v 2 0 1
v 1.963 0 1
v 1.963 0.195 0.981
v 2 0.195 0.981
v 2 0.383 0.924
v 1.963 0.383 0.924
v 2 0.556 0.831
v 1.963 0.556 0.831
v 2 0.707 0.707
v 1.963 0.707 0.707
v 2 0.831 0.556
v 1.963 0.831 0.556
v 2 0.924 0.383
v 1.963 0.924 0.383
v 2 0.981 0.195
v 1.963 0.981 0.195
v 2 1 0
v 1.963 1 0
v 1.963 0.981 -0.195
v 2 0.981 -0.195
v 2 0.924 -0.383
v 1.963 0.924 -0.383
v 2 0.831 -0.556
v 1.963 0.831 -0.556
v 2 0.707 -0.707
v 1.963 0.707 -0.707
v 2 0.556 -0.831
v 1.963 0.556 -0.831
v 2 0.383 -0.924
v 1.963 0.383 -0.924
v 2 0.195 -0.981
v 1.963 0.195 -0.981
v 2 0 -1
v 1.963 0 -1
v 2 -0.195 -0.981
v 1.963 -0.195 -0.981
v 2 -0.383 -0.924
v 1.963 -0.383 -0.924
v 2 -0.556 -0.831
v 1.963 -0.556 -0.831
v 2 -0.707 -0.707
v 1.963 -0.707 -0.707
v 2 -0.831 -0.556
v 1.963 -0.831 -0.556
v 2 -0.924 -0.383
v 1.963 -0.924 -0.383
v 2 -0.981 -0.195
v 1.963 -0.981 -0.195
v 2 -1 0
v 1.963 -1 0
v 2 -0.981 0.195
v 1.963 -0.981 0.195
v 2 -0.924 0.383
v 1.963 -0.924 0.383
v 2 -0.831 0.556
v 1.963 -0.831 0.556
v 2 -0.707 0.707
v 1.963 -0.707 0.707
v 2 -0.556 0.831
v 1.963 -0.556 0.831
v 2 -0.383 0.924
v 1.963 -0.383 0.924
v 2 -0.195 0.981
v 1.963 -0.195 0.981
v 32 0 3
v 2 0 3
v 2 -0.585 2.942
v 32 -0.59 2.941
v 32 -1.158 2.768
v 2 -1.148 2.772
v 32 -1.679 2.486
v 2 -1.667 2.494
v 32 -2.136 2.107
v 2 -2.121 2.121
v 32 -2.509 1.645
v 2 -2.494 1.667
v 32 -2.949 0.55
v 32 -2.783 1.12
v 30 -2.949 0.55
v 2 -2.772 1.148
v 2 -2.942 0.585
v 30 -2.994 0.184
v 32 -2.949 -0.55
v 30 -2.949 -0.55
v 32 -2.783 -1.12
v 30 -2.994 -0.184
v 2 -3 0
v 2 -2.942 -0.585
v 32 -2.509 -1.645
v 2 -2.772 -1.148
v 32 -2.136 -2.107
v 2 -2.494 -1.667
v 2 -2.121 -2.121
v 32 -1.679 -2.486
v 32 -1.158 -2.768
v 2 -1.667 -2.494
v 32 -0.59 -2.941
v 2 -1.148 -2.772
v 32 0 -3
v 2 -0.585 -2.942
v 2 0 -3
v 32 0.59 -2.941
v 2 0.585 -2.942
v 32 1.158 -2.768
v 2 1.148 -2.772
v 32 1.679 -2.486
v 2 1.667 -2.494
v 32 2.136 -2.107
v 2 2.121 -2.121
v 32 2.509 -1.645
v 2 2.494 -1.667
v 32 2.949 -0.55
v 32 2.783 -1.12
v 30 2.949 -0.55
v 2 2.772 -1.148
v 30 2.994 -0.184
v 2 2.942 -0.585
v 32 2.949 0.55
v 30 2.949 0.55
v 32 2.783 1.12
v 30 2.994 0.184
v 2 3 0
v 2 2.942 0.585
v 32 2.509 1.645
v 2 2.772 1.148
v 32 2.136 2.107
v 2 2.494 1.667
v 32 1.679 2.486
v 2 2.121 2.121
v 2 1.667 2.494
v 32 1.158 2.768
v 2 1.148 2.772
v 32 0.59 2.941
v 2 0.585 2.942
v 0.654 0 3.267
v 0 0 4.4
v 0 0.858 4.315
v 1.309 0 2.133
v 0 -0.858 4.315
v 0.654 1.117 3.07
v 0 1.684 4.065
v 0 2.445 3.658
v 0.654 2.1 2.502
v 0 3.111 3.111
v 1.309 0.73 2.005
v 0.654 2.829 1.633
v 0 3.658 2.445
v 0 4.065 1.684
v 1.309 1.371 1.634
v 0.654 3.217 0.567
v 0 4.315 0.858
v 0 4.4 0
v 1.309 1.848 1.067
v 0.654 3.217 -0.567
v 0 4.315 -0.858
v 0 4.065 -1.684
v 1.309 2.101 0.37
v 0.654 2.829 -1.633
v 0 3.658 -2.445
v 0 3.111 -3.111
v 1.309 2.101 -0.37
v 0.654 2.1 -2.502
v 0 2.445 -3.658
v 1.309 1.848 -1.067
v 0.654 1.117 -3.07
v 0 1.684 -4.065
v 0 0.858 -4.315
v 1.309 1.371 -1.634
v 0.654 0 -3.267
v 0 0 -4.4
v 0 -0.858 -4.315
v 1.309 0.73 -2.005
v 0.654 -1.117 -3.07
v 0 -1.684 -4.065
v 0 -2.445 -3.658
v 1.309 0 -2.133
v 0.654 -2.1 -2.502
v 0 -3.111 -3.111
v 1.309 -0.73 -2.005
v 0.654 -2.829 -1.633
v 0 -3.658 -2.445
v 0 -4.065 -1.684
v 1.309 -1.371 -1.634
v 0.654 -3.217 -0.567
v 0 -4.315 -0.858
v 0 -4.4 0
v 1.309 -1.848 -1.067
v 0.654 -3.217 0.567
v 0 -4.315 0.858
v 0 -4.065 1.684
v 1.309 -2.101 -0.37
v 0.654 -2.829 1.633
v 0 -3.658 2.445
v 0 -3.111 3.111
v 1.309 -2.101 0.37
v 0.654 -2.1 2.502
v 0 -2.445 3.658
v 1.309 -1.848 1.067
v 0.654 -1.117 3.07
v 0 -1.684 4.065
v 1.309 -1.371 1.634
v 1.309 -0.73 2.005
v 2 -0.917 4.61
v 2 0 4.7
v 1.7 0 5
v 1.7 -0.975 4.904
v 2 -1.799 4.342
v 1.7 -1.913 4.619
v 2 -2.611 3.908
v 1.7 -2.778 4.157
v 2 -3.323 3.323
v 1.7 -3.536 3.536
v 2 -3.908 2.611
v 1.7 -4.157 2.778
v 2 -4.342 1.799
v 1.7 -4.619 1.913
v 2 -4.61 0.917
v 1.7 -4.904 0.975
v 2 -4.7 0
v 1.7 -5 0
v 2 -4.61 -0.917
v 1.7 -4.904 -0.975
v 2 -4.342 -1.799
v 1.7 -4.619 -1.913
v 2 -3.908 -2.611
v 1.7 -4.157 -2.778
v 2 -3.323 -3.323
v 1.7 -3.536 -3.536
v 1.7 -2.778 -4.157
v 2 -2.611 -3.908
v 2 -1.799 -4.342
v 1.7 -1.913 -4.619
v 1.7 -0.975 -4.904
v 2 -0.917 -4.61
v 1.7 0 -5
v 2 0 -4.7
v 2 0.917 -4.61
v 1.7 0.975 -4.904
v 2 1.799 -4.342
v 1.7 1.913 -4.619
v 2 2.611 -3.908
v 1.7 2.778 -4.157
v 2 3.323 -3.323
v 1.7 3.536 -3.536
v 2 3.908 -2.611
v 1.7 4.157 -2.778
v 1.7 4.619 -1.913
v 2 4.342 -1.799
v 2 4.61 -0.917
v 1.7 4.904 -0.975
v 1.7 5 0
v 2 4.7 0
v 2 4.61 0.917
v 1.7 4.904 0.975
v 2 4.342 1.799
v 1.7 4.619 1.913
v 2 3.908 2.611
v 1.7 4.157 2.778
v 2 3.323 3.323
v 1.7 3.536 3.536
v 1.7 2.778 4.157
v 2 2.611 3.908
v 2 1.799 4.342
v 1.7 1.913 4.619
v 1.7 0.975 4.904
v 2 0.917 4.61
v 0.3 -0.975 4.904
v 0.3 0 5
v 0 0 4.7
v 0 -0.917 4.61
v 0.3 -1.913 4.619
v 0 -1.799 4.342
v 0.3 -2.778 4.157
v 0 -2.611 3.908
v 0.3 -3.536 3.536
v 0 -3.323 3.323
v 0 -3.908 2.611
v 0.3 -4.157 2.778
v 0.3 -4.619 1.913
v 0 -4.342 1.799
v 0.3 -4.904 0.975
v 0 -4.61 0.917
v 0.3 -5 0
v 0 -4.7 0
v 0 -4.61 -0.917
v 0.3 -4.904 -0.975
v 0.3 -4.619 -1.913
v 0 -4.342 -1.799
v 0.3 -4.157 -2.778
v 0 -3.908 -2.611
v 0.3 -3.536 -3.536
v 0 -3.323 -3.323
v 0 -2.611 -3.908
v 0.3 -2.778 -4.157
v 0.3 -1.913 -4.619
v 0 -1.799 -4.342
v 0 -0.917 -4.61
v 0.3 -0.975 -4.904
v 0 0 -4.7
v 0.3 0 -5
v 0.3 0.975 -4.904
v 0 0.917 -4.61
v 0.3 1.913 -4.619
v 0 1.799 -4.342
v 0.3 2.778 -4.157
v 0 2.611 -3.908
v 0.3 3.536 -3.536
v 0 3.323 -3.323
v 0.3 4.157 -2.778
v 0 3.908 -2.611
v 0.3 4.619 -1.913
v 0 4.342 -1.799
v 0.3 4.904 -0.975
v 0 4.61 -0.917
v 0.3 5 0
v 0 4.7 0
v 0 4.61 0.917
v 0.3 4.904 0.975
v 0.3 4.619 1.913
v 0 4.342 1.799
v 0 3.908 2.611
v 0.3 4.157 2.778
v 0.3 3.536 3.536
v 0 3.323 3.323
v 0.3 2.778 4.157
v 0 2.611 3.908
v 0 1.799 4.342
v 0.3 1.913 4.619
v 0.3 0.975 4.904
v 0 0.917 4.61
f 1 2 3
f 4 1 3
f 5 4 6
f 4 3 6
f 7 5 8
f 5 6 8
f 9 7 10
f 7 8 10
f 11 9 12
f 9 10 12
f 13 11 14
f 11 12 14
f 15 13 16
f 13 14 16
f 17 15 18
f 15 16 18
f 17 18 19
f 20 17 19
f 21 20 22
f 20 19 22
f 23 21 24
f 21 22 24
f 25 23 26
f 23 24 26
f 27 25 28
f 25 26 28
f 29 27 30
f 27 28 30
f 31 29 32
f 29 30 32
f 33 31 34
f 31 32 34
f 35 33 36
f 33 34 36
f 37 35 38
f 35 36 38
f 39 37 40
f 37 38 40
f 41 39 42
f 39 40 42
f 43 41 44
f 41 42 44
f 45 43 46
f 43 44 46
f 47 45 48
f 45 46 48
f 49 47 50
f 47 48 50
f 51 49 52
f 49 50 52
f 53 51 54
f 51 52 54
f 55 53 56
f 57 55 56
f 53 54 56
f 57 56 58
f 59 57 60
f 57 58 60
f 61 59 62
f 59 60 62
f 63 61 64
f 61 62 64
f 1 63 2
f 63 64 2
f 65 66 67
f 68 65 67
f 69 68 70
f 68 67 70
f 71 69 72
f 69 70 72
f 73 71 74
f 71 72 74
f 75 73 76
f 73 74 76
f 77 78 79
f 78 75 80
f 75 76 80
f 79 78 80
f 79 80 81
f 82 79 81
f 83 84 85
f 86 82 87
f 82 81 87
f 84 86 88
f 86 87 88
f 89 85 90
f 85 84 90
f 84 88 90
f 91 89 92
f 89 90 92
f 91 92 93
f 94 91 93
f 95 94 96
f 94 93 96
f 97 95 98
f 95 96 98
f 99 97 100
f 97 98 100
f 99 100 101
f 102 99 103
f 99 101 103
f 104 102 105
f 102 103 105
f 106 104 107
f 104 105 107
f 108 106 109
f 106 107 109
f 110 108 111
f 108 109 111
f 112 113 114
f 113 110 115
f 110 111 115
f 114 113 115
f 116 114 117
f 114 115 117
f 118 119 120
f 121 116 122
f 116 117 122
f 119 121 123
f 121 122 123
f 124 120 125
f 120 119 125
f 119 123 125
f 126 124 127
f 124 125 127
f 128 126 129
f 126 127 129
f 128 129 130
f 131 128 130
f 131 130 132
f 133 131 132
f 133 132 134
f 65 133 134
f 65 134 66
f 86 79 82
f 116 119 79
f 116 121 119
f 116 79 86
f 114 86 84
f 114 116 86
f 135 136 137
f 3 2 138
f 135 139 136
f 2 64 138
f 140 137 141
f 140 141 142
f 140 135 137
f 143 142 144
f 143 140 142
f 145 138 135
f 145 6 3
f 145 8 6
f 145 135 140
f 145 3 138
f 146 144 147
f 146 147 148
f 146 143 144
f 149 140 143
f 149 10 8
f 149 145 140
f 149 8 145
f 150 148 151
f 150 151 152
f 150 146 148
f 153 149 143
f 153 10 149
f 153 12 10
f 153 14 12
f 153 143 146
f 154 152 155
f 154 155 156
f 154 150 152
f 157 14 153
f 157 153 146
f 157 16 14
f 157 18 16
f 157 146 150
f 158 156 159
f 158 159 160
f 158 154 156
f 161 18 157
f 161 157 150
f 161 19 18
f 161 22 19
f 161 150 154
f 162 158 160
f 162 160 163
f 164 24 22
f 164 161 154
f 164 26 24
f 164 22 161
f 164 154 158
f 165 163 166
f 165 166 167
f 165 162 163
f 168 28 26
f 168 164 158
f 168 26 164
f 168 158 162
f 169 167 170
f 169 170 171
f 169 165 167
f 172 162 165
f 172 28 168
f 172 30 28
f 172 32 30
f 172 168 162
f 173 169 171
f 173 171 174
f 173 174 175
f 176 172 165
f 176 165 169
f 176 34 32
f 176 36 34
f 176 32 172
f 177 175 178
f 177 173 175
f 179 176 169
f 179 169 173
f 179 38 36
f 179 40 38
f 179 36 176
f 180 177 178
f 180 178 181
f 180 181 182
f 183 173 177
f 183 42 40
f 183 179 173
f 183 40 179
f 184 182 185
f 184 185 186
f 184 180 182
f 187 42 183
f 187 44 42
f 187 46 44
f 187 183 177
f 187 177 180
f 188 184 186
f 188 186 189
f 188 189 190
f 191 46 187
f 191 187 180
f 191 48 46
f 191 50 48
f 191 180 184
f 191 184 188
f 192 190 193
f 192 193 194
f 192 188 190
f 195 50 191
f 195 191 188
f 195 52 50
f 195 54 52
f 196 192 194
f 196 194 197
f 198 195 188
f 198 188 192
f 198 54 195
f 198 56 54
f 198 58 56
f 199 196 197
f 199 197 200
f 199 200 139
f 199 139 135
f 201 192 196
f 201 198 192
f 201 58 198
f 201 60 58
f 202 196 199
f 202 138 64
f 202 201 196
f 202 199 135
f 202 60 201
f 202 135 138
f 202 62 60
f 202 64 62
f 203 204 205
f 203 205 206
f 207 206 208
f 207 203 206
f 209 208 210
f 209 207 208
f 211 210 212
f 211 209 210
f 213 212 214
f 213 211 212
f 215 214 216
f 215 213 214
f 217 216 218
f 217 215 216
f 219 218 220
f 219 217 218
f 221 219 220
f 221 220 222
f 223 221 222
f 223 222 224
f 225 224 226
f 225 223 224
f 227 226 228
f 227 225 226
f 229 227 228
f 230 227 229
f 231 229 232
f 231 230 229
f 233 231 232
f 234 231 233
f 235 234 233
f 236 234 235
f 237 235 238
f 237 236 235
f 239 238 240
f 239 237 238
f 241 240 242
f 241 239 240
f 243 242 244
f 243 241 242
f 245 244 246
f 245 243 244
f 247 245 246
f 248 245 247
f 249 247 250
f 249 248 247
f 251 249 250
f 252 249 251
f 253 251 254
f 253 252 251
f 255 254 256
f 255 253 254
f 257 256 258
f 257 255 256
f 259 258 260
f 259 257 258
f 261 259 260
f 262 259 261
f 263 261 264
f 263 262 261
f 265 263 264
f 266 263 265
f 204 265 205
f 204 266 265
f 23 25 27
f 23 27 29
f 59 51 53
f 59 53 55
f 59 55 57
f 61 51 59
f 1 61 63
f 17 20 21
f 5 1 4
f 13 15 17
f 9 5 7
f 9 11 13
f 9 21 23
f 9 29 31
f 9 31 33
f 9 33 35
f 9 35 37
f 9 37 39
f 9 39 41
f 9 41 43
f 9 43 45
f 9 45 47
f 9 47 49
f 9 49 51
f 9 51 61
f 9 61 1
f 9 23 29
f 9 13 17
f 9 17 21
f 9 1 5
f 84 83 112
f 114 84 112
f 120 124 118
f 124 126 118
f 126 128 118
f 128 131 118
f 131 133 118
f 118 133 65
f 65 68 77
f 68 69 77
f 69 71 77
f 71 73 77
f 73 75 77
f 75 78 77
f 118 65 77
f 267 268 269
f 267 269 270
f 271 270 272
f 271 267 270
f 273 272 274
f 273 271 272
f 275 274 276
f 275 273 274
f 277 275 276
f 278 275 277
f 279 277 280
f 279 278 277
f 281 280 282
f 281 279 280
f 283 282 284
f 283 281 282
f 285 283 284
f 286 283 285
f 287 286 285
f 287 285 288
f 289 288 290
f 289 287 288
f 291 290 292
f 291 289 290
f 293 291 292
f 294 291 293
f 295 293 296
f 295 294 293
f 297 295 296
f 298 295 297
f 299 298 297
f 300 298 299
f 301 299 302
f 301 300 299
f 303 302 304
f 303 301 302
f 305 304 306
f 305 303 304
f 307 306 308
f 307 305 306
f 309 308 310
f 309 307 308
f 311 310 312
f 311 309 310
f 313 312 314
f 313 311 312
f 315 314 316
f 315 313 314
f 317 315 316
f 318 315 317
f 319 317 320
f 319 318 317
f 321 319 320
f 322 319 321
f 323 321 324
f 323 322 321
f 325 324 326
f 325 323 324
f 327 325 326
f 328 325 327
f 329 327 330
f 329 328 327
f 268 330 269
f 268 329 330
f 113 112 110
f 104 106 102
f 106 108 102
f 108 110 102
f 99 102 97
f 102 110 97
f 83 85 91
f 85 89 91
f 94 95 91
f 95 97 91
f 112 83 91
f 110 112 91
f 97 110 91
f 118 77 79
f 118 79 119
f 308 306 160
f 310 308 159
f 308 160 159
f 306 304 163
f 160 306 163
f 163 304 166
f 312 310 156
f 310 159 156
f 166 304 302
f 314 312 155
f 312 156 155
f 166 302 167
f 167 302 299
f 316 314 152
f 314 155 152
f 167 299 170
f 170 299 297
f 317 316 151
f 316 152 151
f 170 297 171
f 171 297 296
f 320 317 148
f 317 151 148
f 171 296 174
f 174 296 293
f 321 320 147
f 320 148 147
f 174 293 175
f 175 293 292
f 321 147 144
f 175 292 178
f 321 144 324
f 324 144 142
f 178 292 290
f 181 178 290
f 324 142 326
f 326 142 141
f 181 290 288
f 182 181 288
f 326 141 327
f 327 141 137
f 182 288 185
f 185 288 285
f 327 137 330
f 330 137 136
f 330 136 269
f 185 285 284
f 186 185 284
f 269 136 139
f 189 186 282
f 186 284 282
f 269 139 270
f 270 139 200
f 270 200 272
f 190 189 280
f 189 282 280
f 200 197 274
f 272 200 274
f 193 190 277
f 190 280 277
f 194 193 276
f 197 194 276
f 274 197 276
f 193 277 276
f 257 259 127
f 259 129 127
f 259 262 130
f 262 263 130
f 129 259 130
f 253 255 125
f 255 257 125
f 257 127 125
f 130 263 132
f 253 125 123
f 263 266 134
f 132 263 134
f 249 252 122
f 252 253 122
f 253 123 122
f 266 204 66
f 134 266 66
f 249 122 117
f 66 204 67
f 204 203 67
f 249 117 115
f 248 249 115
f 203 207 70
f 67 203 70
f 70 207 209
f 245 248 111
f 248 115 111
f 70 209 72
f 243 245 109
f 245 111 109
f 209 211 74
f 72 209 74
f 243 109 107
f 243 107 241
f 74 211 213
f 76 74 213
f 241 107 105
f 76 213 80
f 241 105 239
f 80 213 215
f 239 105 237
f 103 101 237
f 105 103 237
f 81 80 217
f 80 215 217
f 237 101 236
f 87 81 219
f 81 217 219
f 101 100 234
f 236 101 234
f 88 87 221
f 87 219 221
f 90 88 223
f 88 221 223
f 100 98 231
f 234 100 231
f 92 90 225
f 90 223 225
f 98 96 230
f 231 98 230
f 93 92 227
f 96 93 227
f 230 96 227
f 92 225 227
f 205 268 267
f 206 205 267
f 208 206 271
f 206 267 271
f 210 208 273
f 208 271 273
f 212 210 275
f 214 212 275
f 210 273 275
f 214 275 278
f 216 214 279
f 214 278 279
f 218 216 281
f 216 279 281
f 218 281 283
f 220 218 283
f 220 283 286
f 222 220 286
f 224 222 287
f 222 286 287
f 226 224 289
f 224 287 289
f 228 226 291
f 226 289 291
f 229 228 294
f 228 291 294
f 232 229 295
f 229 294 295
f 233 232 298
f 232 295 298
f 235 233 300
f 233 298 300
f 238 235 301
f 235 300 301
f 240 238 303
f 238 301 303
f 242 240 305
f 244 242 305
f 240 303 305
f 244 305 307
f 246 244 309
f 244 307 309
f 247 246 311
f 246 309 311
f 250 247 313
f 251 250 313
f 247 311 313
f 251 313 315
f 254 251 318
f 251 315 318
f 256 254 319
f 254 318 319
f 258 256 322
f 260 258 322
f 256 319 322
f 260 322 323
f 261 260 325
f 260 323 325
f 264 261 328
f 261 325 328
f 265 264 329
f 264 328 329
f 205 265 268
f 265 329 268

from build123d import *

# Parameters (mm, degrees)
ESBO_O3_W                = 1.1
ESBO_O3_H                = 7.097813332
CORTE_EXTRUS_O1_DEPTH    = 2
ESBO_O4_R                = 1
RESSALTO_EXTRUS_O1_DEPTH = 2
ESBO_O8_R                = 1
CORTE_EXTRUS_O2_DEPTH    = 2
CHANFRO2_SIZE            = 3.4
CHANFRO2_SIZE2           = 1.962990915
CHANFRO3_SIZE            = 0.3


with BuildPart() as part:
    # Esboço1 → Revolução1 (revolve)
    with BuildSketch(Plane(origin=(0, 0, 0), x_dir=(1, 0, 0), z_dir=(0, 1, 0)), mode=Mode.PRIVATE) as revolu_o1_sk:
        Polygon((0, 0), (32, 0), (32, 3), (2, 3), (2, 5), (0, 5), align=None)
    revolve(revolu_o1_sk.sketch.rotate(Axis((0, 0, 0), (1, 0, 0)), 180), axis=Axis((0, 0, 0), (1, 0, 0)))

    # Esboço3 → Corte-extrusão1 (cut)
    with BuildSketch(Plane(origin=(32, 0, 0), x_dir=(0, 0, -1), z_dir=(1, 0, 0))):
        with Locations((0, 0.230257265)):
            Rectangle(ESBO_O3_W, ESBO_O3_H)
    extrude(amount=-CORTE_EXTRUS_O1_DEPTH, mode=Mode.SUBTRACT)


with BuildPart() as body_2:
    # Esboço4 → Ressalto-extrusão1 (new body)
    with BuildSketch(Plane.ZY):
        Circle(ESBO_O4_R)
    extrude(amount=-RESSALTO_EXTRUS_O1_DEPTH)


with BuildPart() as corte_extrus_o2_tool:
    # Esboço8 → Corte-extrusão2 (new body)
    with BuildSketch(Plane.ZY):
        Circle(ESBO_O8_R)
    extrude(amount=-CORTE_EXTRUS_O2_DEPTH)


with BuildPart() as part_1:
    add(part.part)

    # Corte-extrusão2: cut by corte_extrus_o2_tool
    add(corte_extrus_o2_tool.part, mode=Mode.SUBTRACT)

    # Chanfro2
    chanfro2_edges = [part_1.edges().sort_by_distance(p)[0] for p in [
        (0, 0, -1),
    ]]
    chanfro2_side = [part_1.faces().sort_by_distance(p)[0] for p in [
        (0, 0, -4.858578644),
    ]]
    chamfer(chanfro2_edges, length=CHANFRO2_SIZE, length2=CHANFRO2_SIZE2, reference=chanfro2_side[0])

    # Chanfro3
    chanfro3_edges = [part_1.edges().sort_by_distance(p)[0] for p in [
        (0, 0, -5),
        (2, 0, -5),
    ]]
    chamfer(chanfro3_edges, length=CHANFRO3_SIZE)


with BuildPart() as body_2_1:
    add(body_2.part)

    # Corte-extrusão2: cut by corte_extrus_o2_tool
    add(corte_extrus_o2_tool.part, mode=Mode.SUBTRACT)


solid = part_1.part
